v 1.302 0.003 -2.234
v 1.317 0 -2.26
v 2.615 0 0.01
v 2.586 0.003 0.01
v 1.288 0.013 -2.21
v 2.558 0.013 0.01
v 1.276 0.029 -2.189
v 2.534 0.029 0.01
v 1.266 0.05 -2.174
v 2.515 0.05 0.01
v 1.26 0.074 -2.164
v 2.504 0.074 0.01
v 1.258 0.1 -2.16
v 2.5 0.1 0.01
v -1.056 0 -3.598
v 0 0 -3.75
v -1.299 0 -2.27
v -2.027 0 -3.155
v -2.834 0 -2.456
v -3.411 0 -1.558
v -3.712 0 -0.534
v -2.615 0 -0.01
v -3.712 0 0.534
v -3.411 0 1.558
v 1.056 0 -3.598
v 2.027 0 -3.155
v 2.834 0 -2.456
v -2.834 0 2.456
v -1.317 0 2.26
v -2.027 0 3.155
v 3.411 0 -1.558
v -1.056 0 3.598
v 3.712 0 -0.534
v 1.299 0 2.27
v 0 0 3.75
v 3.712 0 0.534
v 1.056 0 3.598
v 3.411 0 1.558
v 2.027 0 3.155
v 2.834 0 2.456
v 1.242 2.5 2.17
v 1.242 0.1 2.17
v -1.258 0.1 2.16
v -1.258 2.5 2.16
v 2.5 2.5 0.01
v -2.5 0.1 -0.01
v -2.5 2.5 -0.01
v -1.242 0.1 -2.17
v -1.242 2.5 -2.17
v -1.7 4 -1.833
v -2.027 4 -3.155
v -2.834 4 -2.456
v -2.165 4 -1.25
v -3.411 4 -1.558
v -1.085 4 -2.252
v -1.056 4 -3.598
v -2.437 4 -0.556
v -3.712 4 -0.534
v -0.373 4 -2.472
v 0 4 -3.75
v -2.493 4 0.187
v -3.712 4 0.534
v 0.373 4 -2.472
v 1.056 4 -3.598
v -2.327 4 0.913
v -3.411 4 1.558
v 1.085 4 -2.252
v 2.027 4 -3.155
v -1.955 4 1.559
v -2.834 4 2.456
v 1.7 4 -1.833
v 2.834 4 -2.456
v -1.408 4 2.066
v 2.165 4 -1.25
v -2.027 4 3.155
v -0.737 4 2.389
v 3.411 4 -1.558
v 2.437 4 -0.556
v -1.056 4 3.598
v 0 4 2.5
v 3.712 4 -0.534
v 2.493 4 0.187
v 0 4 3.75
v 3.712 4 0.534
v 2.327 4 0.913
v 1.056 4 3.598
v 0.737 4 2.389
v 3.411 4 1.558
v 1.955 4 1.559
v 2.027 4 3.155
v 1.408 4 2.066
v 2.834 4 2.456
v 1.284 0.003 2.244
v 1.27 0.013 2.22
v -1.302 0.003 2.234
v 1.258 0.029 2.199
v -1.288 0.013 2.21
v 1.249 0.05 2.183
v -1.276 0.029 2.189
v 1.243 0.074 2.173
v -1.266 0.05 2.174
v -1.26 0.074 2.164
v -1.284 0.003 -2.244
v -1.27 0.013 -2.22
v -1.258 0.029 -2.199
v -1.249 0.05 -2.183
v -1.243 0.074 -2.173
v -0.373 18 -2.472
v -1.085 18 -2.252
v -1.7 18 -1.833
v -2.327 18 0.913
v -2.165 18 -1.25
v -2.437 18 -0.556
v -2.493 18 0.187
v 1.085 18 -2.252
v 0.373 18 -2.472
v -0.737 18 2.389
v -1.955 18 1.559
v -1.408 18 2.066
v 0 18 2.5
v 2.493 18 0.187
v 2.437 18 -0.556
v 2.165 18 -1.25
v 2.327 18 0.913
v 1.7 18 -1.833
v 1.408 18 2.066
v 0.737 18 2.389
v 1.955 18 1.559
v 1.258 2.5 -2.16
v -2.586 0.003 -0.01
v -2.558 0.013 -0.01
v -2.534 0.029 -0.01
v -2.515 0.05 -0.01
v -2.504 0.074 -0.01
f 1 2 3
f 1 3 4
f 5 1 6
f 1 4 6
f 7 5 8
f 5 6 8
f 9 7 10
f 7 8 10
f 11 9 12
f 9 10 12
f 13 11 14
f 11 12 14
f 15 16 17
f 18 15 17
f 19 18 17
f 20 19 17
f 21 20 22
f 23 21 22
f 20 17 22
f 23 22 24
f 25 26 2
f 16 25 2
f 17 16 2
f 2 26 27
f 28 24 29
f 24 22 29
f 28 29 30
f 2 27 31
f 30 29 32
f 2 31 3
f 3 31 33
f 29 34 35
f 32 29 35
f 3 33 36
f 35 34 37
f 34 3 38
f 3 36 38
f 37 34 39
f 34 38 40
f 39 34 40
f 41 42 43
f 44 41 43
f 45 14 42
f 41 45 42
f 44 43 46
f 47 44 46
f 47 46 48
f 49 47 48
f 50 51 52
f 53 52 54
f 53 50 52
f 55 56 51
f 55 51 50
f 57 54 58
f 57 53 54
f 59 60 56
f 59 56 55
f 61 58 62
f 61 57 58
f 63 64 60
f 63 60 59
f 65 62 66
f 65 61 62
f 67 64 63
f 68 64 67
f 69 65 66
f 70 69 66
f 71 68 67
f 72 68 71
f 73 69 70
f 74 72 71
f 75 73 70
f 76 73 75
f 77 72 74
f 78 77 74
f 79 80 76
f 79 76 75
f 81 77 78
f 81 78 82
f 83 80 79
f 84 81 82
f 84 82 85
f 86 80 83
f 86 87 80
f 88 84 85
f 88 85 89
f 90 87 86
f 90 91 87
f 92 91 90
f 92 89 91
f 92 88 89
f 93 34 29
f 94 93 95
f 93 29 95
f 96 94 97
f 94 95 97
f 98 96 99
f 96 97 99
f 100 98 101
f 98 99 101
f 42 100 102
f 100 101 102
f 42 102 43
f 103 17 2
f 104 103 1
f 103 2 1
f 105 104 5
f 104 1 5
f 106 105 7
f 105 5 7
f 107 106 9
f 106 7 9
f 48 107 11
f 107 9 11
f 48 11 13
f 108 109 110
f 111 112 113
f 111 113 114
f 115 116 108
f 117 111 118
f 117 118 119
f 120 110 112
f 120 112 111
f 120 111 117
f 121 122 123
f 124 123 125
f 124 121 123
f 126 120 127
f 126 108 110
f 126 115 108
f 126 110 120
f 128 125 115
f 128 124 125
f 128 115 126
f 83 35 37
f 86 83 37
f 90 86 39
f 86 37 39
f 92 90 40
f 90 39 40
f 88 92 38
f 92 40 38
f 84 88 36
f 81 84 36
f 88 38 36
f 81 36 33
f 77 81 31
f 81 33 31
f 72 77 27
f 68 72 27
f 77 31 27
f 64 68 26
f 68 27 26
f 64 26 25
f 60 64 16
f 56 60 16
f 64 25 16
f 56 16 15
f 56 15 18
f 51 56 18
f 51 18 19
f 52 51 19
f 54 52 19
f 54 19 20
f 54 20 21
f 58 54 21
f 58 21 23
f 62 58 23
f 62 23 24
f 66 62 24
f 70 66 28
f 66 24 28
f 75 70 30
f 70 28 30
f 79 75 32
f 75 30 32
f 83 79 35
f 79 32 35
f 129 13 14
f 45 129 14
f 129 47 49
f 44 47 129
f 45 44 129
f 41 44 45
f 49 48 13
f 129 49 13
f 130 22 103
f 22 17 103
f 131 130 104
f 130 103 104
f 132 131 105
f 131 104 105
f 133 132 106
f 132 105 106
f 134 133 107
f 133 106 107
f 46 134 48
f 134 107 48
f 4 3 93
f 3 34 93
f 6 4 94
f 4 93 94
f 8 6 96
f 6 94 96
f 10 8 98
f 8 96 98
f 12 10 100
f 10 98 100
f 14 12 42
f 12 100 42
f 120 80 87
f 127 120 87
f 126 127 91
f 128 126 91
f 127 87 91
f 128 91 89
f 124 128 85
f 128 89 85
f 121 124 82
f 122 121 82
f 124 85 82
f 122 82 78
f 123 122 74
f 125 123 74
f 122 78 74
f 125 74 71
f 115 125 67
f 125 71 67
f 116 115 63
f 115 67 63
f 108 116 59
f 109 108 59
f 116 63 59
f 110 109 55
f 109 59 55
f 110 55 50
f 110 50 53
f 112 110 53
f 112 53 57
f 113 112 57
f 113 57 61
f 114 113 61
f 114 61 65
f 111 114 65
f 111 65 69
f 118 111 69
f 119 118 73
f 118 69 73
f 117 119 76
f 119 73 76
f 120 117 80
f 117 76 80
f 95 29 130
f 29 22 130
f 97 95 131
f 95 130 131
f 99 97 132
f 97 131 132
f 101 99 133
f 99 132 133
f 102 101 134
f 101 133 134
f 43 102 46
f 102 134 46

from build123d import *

# Parameters (mm, degrees)
SKETCH_1_R          = 3.75
EXTRUDE_1_DEPTH     = 4
SKETCH_2_R          = 2.5
EXTRUDE_2_DEPTH     = 14
CUT_EXTRUDE_1_DEPTH = 2.5
FILLET_1_R          = 0.1


with BuildPart() as part:
    # 草图1 → 凸台-拉伸1 (new body)
    with BuildSketch(Plane(origin=(0, 0, 0), x_dir=(1, 0, 0), z_dir=(0, 1, 0))):
        with Locations(Location((0, 0, 0), (0, 0, 270))):
            Circle(SKETCH_1_R)
    extrude(amount=EXTRUDE_1_DEPTH)

    # 草图2 → 凸台-拉伸2 (add)
    with BuildSketch(Plane(origin=(0, 4, 0), x_dir=(1, 0, 0), z_dir=(0, 1, 0))):
        with Locations(Location((0, 0, 0), (0, 0, 270))):
            Circle(SKETCH_2_R)
    extrude(amount=EXTRUDE_2_DEPTH)

    # 草图3 → 切除-拉伸1 (cut)
    with BuildSketch(Plane.XZ):
        Polygon((1.241505751, 2.169967667), (-1.258494249, 2.160159352), (-2.5, -0.009808314), (-1.241505751, -2.169967667), (1.258494249, -2.160159352), (2.5, 0.009808314), align=None)
    extrude(amount=-CUT_EXTRUDE_1_DEPTH, mode=Mode.SUBTRACT)

    # 圆角1
    fillet_1_edges = [part.edges().sort_by_distance(p)[0] for p in [
        (1.870752875, 0, 1.089887991),
        (-0.008494249, 0, 2.165063509),
        (-1.879247125, 0, 1.075175519),
        (-1.870752875, 0, -1.089887991),
        (0.008494249, 0, -2.165063509),
        (1.879247125, 0, -1.075175519),
    ]]
    fillet(fillet_1_edges, radius=FILLET_1_R)


solid = part.part
